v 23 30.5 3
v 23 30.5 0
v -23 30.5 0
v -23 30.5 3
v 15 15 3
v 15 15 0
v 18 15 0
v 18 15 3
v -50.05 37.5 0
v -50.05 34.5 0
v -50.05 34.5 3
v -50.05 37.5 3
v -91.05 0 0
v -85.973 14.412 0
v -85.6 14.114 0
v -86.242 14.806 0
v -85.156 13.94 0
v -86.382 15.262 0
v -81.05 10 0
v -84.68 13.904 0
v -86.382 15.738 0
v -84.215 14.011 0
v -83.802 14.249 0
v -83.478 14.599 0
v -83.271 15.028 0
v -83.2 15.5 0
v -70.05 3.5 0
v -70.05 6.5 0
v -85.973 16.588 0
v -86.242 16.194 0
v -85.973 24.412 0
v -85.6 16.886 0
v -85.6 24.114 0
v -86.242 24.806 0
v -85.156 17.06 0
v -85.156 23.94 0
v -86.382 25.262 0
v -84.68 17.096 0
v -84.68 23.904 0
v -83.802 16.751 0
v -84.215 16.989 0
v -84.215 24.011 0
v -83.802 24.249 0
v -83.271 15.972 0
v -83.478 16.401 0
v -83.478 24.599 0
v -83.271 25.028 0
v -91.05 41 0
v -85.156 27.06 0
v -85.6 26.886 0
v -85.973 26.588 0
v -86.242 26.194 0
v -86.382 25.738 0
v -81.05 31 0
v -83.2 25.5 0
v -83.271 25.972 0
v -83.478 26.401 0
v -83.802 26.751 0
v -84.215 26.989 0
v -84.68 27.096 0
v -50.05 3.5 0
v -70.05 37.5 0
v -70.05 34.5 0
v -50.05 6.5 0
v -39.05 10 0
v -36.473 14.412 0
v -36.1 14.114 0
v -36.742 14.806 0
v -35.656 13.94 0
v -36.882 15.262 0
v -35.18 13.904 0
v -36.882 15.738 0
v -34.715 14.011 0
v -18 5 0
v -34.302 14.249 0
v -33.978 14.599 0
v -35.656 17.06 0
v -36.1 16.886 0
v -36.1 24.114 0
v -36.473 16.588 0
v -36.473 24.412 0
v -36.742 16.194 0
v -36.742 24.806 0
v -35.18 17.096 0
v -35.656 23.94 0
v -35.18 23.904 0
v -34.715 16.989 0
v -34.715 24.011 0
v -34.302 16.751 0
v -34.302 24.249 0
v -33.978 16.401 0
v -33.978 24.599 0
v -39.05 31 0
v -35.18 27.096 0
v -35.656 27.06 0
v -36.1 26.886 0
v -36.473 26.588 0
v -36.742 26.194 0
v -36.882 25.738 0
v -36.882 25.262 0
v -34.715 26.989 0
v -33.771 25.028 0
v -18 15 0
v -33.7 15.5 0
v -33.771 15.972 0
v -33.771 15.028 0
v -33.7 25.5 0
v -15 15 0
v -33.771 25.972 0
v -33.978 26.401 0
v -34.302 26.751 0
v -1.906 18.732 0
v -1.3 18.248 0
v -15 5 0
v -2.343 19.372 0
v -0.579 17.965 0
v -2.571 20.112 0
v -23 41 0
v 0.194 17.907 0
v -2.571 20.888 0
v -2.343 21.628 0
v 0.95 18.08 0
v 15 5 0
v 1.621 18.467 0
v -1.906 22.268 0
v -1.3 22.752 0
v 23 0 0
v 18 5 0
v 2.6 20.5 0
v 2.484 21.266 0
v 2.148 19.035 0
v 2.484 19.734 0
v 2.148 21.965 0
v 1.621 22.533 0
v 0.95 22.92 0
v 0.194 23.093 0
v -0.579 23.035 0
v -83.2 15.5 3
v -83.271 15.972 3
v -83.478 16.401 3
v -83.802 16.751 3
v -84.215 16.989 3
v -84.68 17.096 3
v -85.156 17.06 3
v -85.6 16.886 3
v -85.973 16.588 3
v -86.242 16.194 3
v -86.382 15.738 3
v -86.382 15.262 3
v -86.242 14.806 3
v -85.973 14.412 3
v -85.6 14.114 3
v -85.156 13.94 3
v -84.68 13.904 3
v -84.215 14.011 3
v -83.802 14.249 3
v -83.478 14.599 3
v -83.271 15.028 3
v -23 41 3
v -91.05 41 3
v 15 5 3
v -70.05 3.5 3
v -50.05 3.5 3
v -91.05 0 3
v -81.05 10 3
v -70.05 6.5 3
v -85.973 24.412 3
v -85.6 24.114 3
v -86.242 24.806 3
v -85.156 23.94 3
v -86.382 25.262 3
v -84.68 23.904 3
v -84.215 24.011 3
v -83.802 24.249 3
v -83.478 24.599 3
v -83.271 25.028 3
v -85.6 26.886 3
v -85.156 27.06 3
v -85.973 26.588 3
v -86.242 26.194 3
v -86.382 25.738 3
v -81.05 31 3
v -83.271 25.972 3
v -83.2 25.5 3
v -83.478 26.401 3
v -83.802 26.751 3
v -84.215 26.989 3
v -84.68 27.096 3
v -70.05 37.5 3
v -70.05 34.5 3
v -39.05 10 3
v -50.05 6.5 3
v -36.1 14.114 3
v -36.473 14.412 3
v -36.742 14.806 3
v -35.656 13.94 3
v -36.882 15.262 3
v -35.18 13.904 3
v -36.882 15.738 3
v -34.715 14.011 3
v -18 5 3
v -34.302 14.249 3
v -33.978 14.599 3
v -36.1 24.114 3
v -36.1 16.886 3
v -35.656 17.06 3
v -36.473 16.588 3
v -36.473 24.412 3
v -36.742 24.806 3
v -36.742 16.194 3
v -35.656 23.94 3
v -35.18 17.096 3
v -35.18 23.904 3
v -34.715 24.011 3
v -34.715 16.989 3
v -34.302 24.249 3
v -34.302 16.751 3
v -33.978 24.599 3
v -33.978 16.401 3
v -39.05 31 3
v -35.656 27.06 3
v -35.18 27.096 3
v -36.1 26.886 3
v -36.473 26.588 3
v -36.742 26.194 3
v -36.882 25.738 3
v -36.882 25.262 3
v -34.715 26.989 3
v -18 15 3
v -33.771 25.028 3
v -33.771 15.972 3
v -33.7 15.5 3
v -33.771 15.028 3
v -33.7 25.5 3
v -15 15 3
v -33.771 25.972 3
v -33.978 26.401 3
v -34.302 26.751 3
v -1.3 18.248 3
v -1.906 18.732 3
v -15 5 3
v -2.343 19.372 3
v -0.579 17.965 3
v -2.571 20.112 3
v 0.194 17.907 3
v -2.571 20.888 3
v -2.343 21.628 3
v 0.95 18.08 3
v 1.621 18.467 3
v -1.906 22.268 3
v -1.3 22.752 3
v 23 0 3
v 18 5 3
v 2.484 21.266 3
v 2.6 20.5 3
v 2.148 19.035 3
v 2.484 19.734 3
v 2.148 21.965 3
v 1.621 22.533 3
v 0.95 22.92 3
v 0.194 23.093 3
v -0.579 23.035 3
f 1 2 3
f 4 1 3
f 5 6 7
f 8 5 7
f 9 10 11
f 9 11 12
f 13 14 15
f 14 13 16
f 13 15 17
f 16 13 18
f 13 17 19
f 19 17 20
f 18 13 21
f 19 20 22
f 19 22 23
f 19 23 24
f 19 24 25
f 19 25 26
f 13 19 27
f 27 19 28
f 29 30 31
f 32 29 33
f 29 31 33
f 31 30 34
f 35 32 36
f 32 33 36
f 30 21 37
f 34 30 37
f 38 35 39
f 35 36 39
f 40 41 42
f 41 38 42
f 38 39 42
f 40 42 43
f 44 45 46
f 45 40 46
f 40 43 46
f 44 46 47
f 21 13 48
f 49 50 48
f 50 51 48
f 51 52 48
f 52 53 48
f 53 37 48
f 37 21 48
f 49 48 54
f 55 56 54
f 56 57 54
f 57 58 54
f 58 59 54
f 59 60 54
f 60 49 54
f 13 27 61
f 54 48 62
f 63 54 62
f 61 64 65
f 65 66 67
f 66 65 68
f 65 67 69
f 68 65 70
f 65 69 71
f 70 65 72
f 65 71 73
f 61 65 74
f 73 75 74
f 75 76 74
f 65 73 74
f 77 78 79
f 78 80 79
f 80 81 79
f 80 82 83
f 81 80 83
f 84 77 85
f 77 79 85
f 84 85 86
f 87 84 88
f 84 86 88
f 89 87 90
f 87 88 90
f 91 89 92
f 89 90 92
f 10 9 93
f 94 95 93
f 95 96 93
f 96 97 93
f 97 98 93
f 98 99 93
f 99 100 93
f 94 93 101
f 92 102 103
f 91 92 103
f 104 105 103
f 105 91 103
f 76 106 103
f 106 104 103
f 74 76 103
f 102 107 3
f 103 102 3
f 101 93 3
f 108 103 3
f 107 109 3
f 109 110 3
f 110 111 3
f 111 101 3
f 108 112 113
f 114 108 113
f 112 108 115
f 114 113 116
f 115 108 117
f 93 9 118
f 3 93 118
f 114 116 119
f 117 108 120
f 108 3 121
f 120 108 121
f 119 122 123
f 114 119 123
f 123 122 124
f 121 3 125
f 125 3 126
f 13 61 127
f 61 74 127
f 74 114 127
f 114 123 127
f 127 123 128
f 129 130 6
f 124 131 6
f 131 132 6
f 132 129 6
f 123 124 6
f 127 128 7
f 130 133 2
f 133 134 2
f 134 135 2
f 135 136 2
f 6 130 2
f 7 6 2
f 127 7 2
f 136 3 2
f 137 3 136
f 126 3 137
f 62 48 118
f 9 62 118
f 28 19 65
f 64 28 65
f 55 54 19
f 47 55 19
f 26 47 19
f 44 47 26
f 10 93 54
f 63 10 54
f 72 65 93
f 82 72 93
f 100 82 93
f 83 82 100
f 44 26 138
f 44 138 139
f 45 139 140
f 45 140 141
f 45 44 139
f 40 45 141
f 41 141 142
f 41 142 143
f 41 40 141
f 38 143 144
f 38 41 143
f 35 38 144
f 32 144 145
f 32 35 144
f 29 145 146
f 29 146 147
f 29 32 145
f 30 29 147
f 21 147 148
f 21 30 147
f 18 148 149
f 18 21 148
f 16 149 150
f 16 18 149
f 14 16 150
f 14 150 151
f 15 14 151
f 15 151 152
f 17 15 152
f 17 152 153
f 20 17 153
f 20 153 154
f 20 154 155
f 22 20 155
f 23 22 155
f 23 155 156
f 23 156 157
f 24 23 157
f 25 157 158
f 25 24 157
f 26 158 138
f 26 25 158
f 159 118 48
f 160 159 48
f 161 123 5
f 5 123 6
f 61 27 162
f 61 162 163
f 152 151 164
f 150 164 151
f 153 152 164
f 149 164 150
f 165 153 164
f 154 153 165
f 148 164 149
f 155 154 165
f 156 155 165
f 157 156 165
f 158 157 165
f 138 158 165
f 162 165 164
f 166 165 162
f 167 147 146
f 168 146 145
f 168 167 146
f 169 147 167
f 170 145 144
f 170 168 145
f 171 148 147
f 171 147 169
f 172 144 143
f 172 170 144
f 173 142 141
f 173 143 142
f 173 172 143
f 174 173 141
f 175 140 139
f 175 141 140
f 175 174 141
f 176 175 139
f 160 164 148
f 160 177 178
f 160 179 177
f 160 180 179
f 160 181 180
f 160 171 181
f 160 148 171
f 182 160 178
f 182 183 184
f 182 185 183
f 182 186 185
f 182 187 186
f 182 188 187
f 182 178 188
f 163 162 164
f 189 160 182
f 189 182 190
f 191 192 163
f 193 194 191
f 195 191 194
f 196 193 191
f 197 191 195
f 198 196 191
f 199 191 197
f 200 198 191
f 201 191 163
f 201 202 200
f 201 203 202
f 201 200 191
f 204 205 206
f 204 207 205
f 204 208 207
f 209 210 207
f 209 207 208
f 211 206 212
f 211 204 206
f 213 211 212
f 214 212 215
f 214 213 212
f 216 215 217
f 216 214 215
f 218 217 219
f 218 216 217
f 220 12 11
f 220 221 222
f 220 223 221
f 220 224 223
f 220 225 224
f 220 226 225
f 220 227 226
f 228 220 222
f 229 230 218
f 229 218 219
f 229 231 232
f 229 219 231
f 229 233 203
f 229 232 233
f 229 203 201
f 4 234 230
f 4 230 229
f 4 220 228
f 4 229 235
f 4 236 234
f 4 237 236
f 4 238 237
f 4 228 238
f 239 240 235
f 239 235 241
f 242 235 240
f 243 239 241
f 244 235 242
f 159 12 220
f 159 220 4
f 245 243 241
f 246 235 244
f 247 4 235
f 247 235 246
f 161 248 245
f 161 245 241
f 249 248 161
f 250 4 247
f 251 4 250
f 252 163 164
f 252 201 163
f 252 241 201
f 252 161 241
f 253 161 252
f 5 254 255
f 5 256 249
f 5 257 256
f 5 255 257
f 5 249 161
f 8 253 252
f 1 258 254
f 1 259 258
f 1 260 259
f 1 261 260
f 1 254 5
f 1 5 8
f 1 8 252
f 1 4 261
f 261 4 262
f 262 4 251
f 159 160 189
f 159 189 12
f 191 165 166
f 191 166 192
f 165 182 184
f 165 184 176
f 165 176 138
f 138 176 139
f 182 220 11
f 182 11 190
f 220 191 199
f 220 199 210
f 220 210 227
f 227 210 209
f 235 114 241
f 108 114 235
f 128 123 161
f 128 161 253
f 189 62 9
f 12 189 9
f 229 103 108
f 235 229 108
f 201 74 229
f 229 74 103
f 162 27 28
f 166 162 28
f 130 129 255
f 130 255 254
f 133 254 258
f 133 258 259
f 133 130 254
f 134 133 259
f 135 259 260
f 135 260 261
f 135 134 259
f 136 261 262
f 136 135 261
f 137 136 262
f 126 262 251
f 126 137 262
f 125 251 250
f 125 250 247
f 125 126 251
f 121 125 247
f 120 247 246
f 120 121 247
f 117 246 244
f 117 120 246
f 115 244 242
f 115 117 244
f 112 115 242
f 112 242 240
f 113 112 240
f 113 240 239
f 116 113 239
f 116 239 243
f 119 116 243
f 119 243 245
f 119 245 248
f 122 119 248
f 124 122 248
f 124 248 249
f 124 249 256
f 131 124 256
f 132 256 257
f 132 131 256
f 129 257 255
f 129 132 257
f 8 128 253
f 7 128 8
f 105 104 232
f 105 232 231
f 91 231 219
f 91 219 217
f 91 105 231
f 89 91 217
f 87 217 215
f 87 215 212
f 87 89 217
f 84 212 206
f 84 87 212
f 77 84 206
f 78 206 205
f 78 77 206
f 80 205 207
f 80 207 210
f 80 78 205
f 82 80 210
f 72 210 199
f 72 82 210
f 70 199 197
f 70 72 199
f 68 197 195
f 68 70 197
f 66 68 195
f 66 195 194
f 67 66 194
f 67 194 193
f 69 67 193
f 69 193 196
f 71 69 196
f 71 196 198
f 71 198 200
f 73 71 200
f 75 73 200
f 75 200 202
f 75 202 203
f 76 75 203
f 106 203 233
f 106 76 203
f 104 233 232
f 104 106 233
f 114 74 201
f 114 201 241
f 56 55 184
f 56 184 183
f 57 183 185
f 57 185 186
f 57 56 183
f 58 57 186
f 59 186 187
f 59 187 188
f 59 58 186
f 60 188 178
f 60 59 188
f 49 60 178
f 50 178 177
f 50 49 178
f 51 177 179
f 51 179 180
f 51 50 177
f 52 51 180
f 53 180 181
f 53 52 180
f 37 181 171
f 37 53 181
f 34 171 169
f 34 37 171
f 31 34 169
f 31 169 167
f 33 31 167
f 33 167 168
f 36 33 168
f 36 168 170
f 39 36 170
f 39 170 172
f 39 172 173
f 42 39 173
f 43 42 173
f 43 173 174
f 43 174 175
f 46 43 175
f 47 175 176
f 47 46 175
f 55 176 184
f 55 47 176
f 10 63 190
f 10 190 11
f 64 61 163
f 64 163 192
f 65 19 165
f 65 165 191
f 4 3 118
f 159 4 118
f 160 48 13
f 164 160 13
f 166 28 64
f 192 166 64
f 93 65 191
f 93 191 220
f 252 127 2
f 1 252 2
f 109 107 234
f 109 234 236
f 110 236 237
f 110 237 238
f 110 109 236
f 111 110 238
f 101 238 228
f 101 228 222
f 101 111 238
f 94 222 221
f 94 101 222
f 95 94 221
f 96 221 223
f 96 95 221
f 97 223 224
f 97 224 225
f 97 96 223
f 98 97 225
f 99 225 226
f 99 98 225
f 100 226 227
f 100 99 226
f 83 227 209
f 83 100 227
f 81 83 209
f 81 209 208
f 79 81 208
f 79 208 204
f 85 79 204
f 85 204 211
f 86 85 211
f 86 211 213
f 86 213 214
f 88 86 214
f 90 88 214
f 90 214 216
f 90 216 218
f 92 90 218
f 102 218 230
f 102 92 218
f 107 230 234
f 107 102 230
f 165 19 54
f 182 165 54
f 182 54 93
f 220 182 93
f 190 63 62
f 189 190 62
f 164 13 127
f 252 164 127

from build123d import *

# Parameters (mm, degrees)
ESBO_O1_W                = 20
ESBO_O1_H                = 3
ESBO_O1_R                = 1.6
ESBO_O1_W_2              = 42
ESBO_O1_H_2              = 21
ESBO_O1_W_3              = 3
ESBO_O1_H_3              = 10
ESBO_O1_R_2              = 2.6
RESSALTO_EXTRUS_O1_DEPTH = 3


with BuildPart() as part:
    # Esboço1 → Ressalto-extrusão1 (new body)
    with BuildSketch(Plane.XY):
        Polygon((-23, 0), (23, 0), (23, 30.5), (-23, 30.5), (-23, 41), (-91.05, 41), (-91.05, 0), align=None)
        with Locations((-60.05, 5)):
            Rectangle(ESBO_O1_W, ESBO_O1_H, mode=Mode.SUBTRACT)
        with Locations((-84.8, 15.5)):
            Circle(ESBO_O1_R, mode=Mode.SUBTRACT)
        with Locations((-60.05, 20.5)):
            Rectangle(ESBO_O1_W_2, ESBO_O1_H_2, mode=Mode.SUBTRACT)
        with Locations((-35.3, 15.5)):
            Circle(ESBO_O1_R, mode=Mode.SUBTRACT)
        with Locations((-16.5, 10)):
            Rectangle(ESBO_O1_W_3, ESBO_O1_H_3, mode=Mode.SUBTRACT)
        with Locations((16.5, 10)):
            Rectangle(ESBO_O1_W_3, ESBO_O1_H_3, mode=Mode.SUBTRACT)
        with Locations((0, 20.5)):
            Circle(ESBO_O1_R_2, mode=Mode.SUBTRACT)
        with Locations((-84.8, 25.5)):
            Circle(ESBO_O1_R, mode=Mode.SUBTRACT)
        with Locations((-35.3, 25.5)):
            Circle(ESBO_O1_R, mode=Mode.SUBTRACT)
        with Locations((-60.05, 36)):
            Rectangle(ESBO_O1_W, ESBO_O1_H, mode=Mode.SUBTRACT)
    extrude(amount=RESSALTO_EXTRUS_O1_DEPTH)


solid = part.part
